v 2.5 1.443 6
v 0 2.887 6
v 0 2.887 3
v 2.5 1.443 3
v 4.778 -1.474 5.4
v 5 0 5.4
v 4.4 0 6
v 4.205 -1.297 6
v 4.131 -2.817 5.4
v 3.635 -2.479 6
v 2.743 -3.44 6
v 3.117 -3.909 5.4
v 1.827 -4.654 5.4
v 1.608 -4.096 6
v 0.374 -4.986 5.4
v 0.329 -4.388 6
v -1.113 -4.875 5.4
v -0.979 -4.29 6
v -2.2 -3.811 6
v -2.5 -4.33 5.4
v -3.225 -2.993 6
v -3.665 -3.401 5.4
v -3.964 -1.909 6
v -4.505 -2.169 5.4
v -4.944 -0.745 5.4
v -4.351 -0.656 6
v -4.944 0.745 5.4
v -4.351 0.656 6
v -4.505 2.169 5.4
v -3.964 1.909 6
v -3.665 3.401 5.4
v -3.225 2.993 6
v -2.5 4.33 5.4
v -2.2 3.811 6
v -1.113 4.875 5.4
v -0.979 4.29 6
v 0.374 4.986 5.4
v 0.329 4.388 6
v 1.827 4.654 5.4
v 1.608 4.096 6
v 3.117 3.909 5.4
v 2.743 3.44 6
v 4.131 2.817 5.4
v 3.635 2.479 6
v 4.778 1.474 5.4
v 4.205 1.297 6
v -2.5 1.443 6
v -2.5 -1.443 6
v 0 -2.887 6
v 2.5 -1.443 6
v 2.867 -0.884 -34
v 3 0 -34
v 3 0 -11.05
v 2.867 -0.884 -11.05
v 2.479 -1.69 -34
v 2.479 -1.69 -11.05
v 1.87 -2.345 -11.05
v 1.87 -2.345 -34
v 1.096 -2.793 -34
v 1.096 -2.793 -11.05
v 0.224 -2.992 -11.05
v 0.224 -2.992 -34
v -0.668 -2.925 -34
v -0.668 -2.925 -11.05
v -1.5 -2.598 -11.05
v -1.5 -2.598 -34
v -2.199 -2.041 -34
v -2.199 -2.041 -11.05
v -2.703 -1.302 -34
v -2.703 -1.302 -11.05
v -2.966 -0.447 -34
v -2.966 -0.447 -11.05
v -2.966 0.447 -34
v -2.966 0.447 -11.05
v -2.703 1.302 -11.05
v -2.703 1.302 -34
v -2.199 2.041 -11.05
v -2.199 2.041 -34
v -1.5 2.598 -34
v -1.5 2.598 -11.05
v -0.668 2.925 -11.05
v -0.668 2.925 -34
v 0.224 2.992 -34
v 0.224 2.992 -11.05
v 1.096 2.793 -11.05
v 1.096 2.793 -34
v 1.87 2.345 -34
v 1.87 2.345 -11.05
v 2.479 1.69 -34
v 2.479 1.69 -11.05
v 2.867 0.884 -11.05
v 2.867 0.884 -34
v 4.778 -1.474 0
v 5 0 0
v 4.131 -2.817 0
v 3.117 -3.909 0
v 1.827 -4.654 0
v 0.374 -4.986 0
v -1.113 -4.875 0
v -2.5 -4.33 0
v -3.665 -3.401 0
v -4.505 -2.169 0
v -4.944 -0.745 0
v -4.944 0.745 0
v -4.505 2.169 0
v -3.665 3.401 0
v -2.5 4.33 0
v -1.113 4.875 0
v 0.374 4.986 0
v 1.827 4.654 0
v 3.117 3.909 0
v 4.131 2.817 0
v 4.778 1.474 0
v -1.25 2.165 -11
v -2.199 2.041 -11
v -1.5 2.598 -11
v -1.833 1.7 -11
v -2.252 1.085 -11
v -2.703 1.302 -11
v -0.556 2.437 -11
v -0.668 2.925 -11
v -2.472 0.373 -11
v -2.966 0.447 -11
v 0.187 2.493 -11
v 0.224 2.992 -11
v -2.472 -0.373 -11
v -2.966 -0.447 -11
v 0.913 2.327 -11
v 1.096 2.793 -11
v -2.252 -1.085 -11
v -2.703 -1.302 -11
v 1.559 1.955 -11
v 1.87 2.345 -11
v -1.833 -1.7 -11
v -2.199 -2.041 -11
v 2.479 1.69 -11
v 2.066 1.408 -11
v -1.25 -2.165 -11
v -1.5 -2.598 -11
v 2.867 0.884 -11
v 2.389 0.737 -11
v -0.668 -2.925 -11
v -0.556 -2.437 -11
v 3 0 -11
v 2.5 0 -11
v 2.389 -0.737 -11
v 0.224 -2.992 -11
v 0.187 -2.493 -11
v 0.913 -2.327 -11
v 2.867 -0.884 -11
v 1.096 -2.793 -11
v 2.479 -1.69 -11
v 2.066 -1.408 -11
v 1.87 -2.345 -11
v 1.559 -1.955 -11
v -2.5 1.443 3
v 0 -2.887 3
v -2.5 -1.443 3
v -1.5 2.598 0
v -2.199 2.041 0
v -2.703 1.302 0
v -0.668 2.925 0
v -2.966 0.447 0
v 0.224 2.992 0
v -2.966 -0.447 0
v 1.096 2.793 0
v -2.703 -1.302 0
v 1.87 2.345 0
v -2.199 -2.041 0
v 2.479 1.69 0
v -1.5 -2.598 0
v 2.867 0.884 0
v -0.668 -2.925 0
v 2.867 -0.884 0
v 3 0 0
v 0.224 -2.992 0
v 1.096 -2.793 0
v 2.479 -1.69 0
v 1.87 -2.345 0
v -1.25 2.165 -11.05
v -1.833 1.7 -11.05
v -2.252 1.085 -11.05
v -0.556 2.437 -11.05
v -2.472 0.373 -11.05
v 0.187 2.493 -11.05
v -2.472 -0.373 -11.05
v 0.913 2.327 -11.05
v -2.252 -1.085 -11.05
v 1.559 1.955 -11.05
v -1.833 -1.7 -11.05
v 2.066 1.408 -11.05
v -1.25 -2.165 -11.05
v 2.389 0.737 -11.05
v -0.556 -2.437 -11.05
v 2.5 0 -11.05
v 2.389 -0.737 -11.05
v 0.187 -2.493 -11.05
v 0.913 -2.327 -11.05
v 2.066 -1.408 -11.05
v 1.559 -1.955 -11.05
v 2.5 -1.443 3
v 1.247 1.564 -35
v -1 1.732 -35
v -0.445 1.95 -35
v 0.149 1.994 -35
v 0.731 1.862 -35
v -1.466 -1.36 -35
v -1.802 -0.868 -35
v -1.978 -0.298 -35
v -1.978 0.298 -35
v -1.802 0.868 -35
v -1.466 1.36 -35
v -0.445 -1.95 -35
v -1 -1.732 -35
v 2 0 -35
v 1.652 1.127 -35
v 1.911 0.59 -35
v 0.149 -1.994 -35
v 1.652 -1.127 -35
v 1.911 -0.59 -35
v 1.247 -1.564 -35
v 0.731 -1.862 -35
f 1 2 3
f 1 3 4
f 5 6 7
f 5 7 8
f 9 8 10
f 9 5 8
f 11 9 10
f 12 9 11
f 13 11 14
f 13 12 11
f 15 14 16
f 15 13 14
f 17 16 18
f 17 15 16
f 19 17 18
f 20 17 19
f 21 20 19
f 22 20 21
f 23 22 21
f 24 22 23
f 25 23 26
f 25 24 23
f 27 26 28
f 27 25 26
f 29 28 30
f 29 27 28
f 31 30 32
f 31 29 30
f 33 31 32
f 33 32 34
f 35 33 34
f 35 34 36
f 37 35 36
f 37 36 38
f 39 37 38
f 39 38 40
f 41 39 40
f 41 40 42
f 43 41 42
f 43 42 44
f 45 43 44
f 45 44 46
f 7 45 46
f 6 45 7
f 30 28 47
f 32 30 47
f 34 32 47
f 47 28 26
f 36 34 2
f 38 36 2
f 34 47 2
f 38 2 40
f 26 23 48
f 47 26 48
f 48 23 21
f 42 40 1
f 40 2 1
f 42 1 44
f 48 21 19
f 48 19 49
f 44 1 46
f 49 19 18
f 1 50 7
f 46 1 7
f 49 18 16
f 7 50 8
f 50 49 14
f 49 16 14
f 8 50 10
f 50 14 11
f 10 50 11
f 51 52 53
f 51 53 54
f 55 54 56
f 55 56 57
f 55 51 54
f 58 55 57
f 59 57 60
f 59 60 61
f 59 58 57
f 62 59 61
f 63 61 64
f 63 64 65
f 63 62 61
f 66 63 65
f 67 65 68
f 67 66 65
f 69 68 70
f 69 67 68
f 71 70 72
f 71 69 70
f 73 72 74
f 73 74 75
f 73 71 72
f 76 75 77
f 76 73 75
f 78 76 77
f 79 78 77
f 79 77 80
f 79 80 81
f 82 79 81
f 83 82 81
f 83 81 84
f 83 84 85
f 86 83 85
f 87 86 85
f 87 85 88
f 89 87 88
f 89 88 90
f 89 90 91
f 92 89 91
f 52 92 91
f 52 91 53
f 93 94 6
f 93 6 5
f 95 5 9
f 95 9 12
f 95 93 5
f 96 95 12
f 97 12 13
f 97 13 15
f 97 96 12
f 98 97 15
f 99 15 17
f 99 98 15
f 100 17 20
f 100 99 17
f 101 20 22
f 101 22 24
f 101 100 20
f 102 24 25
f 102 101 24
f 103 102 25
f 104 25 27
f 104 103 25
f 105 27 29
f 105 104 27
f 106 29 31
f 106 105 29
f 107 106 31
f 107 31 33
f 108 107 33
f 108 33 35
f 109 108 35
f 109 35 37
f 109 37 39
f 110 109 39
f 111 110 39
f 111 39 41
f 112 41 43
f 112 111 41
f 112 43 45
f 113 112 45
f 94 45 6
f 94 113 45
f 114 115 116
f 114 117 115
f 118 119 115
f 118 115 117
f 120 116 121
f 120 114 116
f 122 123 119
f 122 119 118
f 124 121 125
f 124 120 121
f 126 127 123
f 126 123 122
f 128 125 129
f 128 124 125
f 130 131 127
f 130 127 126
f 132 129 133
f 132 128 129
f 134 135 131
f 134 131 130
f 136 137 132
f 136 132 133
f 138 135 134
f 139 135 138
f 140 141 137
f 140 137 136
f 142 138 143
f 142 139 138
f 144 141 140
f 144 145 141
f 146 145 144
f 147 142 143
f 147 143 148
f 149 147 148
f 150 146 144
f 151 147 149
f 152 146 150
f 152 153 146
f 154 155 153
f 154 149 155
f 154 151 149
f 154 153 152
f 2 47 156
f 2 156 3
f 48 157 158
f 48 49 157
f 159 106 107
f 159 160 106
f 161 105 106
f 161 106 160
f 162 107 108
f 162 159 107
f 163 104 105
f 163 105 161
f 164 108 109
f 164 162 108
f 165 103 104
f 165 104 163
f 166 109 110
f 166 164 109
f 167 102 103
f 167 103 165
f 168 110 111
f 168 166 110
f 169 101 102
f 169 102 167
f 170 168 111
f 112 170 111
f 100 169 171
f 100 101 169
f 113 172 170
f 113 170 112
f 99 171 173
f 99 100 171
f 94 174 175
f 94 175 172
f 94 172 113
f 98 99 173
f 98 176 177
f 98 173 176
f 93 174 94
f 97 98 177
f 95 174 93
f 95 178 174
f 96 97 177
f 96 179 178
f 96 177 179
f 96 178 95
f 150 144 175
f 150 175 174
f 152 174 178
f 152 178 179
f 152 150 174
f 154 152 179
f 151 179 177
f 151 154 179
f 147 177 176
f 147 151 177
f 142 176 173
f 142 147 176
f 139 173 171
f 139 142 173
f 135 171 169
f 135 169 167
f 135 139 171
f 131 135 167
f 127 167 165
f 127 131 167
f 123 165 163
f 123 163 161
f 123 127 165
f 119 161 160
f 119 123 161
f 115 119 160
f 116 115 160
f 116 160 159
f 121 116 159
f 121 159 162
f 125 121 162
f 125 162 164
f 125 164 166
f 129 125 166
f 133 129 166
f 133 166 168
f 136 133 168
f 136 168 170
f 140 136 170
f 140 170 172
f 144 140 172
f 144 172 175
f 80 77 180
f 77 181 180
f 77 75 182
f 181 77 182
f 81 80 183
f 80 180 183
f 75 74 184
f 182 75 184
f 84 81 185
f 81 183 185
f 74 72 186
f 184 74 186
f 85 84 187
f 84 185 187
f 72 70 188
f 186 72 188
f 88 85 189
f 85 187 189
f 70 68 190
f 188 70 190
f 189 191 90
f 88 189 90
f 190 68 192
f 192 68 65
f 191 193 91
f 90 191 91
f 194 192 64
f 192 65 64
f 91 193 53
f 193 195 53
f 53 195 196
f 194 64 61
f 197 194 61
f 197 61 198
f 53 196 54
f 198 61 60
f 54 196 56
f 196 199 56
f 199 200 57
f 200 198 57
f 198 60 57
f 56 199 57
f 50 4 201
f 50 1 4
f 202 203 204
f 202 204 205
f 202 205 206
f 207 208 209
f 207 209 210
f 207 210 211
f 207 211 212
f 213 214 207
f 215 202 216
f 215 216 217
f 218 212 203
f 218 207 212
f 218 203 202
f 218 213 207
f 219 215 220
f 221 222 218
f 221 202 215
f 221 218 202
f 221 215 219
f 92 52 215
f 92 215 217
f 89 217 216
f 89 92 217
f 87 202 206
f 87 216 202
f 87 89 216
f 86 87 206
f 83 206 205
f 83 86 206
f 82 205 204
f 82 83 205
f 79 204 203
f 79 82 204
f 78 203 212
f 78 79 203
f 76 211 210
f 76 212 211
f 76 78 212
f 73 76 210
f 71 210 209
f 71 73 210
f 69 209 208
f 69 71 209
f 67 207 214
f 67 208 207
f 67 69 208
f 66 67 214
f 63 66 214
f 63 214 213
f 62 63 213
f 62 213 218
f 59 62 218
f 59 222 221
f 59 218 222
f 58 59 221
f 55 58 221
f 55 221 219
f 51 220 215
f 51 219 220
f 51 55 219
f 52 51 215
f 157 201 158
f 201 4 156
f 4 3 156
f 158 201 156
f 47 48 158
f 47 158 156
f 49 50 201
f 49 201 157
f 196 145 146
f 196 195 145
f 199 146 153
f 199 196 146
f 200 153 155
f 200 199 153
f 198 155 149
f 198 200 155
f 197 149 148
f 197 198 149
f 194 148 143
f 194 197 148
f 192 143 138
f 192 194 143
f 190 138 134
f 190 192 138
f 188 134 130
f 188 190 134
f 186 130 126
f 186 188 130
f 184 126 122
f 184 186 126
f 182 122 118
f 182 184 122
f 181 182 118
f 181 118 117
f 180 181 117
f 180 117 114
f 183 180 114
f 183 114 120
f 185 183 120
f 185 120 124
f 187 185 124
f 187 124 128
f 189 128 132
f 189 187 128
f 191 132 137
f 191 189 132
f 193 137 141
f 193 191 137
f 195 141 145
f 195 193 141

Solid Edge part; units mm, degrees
sketch "Sketch1" plane through (0, 0, 0) normal (0, -1, 0) x (1, 0, 0)
  line L0 (0, 6) -> (4.4, 6)
  line L1 (4.4, 6) -> (5, 5.4)
  line L2 (5, 5.4) -> (5, 0)
  line L3 (5, 0) -> (3, 0)
  line L4 (3, 0) -> (3, -34)
  line L5 (3, -34) -> (2, -35)
  line L6 (2, -35) -> (0, -35)
  line L7 (0, -35) -> (0, 6)
  dimension "D1" = 6
  dimension "D2" = 35
  dimension "D3" = 1
  dimension "D4" = 0.6
  dimension "D5" = 0.6
revolve "RevolvedProtrusion1" add sketch "Sketch1" angle 360 about axis through (0, 0, 54) along (0, 0, -1)
sketch "Sketch2" plane through (0, 0, 6) normal (0, 0, 1) x (0, 1, 0)
  line L0 (-2.8868, 0) -> (-1.4434, 2.5)
  line L1 (-1.4434, 2.5) -> (1.4434, 2.5)
  line L2 (1.4434, 2.5) -> (2.8868, 0)
  line L3 (2.8868, 0) -> (1.4434, -2.5)
  line L4 (1.4434, -2.5) -> (-1.4434, -2.5)
  line L5 (-1.4434, -2.5) -> (-2.8868, 0)
  dimension "D1" = 5
extrude "Cutout1" cut sketch "Sketch2" against normal blind 3
sketch "Sketch3" plane through (0, 0, 0) normal (0, -1, 0) x (1, 0, 0)
  line L0 (3, -11) -> (2.5, -11)
  line L1 (2.5, -11) -> (2.5, -11.05)
  line L2 (2.5, -11.05) -> (3, -11.05)
  dimension "D1" = 0.05
  dimension "D2" = 11
revolve "RevolvedCutout1" cut sketch "Sketch3" angle 360 about axis through (0, 0, 54) along (0, 0, -1) material side at (2.75, 0, -11.05)
cosmetic_thread "Thread1"
properties material "Steel"
